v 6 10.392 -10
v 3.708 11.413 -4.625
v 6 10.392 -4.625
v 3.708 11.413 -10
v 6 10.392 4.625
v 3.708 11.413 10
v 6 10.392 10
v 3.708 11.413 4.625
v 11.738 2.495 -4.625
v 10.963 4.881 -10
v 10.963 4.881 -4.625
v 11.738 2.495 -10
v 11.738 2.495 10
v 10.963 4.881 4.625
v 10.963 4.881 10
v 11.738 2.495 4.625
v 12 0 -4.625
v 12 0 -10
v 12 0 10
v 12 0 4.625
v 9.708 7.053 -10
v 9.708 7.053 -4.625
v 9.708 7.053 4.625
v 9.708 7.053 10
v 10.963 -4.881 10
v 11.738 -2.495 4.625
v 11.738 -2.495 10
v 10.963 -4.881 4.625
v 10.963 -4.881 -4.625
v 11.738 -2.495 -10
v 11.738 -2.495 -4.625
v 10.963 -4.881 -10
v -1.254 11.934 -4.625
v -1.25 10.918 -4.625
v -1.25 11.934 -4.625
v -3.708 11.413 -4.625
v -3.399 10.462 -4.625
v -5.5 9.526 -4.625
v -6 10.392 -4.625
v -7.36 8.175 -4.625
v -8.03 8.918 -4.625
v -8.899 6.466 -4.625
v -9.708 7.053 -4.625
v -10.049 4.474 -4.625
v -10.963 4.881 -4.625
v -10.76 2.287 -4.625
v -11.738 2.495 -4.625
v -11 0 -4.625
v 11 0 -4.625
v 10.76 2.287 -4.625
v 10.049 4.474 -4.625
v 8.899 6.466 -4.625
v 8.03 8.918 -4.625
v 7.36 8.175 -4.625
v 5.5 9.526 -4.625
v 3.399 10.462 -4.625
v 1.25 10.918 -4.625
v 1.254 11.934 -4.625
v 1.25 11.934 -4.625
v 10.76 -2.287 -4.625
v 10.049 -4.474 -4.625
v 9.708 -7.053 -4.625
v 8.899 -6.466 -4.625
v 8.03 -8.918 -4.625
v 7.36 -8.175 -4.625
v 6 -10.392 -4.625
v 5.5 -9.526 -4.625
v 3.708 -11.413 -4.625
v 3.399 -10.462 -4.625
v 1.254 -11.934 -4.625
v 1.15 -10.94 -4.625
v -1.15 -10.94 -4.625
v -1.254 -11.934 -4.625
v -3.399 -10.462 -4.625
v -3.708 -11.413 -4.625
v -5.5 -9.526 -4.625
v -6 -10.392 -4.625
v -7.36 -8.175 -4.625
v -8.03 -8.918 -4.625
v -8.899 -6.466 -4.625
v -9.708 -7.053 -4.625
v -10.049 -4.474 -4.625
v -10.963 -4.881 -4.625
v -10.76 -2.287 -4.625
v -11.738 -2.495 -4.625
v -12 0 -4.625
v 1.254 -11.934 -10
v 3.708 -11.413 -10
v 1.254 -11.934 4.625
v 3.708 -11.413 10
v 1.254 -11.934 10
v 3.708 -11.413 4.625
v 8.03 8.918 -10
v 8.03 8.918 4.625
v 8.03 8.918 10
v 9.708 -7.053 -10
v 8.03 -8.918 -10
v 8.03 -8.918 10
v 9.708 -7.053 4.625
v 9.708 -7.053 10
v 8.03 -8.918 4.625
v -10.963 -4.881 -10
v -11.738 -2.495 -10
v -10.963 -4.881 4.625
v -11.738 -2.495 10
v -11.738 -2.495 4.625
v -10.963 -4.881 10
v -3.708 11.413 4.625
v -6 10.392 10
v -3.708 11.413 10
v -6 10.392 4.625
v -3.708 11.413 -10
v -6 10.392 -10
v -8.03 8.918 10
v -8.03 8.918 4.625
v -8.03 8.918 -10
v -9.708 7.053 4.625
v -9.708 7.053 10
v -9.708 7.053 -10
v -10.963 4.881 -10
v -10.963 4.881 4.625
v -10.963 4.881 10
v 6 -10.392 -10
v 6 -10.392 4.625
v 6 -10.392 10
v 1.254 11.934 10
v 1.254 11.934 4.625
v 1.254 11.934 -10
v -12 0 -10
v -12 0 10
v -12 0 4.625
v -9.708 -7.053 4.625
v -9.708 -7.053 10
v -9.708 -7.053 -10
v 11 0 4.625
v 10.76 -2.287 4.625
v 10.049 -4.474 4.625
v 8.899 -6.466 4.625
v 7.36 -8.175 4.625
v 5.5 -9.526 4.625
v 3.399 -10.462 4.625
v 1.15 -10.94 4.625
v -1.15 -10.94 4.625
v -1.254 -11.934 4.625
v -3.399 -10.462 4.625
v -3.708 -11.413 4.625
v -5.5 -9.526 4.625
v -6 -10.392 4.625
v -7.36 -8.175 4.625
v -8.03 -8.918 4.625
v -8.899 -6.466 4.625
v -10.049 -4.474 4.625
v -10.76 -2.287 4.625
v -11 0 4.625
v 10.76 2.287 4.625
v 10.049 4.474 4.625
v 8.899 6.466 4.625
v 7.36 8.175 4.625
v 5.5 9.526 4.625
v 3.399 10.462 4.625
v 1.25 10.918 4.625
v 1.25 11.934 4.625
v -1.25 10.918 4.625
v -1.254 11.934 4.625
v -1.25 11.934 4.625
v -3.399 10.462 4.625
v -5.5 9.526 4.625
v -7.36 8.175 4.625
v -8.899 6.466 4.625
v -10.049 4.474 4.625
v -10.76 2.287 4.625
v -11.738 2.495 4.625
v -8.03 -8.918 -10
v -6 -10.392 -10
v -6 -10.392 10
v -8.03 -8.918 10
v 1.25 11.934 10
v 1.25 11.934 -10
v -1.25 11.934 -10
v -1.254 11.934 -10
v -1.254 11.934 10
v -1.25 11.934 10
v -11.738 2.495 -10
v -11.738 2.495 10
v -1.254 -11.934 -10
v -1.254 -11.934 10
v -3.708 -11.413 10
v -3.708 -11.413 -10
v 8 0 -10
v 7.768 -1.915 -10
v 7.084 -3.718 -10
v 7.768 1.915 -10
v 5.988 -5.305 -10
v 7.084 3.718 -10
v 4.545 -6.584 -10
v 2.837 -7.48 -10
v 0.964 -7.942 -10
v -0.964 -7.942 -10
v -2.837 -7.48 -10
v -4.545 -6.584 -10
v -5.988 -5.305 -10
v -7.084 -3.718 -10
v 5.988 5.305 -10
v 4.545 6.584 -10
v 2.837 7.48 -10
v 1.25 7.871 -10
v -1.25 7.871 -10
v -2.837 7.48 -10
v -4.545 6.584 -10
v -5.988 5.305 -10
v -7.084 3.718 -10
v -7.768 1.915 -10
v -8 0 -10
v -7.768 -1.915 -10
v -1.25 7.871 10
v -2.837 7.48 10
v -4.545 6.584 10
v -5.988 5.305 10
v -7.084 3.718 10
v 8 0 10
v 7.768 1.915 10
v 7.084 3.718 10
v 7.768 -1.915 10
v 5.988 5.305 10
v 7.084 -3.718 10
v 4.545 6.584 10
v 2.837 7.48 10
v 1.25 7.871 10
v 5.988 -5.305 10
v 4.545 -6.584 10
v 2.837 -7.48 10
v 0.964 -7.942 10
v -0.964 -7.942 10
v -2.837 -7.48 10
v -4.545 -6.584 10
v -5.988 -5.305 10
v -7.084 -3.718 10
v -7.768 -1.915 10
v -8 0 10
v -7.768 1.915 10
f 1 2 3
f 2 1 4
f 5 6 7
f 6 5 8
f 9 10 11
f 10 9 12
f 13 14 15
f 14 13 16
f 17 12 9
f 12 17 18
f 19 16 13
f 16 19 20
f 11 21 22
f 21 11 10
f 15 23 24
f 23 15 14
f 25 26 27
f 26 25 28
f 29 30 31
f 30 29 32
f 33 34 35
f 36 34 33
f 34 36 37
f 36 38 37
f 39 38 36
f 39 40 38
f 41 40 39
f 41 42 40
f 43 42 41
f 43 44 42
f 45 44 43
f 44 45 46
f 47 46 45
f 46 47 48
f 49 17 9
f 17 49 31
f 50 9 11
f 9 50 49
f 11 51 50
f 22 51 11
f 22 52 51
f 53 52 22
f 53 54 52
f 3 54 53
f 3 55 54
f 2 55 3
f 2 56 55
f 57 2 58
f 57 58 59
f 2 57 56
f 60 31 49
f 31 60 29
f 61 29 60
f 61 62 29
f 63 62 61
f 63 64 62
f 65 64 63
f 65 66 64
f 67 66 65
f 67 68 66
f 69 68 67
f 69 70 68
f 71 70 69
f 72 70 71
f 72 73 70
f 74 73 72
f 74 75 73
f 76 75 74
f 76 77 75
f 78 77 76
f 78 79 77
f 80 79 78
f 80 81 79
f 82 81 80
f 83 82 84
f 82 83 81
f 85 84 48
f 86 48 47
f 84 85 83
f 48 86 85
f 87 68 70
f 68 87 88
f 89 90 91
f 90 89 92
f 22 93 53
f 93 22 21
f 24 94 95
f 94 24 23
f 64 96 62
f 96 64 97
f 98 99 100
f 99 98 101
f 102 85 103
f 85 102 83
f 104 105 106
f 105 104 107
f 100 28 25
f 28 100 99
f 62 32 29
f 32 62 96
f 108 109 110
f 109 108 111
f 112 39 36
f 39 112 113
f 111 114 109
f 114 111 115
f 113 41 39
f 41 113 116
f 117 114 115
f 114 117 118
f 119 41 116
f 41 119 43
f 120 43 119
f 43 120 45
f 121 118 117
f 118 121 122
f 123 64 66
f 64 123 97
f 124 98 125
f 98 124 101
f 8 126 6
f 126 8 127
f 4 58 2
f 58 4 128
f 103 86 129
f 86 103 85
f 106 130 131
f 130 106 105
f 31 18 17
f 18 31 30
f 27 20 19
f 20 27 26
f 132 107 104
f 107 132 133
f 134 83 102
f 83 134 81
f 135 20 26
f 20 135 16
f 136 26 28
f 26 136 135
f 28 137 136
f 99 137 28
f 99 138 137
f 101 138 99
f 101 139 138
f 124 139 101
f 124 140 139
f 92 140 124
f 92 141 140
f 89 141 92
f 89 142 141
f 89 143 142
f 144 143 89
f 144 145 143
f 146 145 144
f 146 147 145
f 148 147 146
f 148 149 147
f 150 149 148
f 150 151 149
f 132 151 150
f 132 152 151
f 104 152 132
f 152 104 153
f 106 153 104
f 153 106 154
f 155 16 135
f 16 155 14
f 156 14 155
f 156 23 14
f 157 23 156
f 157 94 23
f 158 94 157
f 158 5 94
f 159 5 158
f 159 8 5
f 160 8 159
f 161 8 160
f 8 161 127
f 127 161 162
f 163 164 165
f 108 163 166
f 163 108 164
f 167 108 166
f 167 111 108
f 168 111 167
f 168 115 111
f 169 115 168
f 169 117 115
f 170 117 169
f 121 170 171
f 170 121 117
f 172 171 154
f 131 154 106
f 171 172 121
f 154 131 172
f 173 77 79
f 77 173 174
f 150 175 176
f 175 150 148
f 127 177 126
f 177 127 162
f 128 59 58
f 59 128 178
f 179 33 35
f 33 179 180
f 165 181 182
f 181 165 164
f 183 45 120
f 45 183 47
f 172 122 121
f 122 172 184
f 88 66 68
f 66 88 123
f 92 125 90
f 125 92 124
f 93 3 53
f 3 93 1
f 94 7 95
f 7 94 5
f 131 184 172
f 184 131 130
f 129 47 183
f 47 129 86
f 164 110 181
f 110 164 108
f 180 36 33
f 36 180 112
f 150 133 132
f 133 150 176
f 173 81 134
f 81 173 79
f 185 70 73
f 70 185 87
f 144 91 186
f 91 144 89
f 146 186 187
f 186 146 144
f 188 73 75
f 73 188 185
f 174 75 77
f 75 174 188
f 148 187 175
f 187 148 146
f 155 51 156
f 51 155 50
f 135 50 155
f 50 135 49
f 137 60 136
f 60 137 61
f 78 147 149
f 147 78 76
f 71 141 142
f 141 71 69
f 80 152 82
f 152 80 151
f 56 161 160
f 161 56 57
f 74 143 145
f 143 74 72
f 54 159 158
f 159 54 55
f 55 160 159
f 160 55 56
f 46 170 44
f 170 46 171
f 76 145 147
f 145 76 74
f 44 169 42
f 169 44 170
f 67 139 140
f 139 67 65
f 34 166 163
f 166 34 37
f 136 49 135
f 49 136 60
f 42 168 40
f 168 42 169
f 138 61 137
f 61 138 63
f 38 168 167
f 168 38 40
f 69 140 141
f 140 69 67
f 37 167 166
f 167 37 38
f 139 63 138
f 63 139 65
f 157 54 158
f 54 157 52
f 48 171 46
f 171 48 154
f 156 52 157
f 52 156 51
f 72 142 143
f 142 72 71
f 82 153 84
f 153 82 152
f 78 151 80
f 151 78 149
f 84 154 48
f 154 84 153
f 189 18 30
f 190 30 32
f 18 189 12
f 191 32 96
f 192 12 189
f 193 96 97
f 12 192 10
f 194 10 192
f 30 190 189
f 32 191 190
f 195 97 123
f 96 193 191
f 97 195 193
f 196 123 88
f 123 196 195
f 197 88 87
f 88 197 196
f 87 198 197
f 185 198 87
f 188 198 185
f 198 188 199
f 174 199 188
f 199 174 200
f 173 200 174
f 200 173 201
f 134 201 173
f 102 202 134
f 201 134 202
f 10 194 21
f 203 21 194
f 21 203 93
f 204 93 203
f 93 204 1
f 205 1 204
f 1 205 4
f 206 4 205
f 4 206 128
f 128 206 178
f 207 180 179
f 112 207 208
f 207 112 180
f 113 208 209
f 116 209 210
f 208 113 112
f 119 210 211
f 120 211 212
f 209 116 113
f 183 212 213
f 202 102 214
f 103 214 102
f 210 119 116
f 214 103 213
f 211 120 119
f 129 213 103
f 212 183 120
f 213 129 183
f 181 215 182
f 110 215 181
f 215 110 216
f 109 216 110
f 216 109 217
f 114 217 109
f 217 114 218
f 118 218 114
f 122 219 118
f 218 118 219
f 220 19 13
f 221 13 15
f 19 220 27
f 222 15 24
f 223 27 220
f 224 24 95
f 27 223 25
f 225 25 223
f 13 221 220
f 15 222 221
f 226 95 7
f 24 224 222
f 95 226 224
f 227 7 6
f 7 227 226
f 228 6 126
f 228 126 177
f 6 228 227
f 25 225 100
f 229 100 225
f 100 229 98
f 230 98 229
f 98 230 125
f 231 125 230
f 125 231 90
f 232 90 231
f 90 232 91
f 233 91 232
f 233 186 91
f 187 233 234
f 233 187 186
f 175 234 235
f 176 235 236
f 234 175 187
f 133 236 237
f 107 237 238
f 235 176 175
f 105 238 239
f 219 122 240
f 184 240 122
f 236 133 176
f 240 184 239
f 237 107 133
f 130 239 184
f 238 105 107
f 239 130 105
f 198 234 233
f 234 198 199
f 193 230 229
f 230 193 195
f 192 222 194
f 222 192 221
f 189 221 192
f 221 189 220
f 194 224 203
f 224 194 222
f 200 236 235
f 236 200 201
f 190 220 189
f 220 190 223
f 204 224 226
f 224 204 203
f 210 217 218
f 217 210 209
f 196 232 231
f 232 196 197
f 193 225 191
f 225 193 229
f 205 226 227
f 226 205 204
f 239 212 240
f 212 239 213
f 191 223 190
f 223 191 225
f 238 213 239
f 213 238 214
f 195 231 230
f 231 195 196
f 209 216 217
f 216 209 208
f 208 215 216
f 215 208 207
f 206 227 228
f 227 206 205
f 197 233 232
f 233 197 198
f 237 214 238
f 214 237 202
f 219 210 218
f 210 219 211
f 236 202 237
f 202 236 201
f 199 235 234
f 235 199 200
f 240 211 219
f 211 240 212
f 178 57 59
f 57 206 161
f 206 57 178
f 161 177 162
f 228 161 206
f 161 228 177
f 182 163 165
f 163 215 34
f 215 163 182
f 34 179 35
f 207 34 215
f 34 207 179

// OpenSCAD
rotate([0,0,0])
difference() {
  length=20;
  cylinder(r=12, h=length,center=true);

  cylinder(r=8, h=length, center=true);
  translate([0,5])
  cube(size = [2.5,20,length], center=true);
  render()
  difference(){
    cylinder(r=12, h=9.25,center=true);
    cylinder(r=11, h=9.25,center=true);
  }
}
